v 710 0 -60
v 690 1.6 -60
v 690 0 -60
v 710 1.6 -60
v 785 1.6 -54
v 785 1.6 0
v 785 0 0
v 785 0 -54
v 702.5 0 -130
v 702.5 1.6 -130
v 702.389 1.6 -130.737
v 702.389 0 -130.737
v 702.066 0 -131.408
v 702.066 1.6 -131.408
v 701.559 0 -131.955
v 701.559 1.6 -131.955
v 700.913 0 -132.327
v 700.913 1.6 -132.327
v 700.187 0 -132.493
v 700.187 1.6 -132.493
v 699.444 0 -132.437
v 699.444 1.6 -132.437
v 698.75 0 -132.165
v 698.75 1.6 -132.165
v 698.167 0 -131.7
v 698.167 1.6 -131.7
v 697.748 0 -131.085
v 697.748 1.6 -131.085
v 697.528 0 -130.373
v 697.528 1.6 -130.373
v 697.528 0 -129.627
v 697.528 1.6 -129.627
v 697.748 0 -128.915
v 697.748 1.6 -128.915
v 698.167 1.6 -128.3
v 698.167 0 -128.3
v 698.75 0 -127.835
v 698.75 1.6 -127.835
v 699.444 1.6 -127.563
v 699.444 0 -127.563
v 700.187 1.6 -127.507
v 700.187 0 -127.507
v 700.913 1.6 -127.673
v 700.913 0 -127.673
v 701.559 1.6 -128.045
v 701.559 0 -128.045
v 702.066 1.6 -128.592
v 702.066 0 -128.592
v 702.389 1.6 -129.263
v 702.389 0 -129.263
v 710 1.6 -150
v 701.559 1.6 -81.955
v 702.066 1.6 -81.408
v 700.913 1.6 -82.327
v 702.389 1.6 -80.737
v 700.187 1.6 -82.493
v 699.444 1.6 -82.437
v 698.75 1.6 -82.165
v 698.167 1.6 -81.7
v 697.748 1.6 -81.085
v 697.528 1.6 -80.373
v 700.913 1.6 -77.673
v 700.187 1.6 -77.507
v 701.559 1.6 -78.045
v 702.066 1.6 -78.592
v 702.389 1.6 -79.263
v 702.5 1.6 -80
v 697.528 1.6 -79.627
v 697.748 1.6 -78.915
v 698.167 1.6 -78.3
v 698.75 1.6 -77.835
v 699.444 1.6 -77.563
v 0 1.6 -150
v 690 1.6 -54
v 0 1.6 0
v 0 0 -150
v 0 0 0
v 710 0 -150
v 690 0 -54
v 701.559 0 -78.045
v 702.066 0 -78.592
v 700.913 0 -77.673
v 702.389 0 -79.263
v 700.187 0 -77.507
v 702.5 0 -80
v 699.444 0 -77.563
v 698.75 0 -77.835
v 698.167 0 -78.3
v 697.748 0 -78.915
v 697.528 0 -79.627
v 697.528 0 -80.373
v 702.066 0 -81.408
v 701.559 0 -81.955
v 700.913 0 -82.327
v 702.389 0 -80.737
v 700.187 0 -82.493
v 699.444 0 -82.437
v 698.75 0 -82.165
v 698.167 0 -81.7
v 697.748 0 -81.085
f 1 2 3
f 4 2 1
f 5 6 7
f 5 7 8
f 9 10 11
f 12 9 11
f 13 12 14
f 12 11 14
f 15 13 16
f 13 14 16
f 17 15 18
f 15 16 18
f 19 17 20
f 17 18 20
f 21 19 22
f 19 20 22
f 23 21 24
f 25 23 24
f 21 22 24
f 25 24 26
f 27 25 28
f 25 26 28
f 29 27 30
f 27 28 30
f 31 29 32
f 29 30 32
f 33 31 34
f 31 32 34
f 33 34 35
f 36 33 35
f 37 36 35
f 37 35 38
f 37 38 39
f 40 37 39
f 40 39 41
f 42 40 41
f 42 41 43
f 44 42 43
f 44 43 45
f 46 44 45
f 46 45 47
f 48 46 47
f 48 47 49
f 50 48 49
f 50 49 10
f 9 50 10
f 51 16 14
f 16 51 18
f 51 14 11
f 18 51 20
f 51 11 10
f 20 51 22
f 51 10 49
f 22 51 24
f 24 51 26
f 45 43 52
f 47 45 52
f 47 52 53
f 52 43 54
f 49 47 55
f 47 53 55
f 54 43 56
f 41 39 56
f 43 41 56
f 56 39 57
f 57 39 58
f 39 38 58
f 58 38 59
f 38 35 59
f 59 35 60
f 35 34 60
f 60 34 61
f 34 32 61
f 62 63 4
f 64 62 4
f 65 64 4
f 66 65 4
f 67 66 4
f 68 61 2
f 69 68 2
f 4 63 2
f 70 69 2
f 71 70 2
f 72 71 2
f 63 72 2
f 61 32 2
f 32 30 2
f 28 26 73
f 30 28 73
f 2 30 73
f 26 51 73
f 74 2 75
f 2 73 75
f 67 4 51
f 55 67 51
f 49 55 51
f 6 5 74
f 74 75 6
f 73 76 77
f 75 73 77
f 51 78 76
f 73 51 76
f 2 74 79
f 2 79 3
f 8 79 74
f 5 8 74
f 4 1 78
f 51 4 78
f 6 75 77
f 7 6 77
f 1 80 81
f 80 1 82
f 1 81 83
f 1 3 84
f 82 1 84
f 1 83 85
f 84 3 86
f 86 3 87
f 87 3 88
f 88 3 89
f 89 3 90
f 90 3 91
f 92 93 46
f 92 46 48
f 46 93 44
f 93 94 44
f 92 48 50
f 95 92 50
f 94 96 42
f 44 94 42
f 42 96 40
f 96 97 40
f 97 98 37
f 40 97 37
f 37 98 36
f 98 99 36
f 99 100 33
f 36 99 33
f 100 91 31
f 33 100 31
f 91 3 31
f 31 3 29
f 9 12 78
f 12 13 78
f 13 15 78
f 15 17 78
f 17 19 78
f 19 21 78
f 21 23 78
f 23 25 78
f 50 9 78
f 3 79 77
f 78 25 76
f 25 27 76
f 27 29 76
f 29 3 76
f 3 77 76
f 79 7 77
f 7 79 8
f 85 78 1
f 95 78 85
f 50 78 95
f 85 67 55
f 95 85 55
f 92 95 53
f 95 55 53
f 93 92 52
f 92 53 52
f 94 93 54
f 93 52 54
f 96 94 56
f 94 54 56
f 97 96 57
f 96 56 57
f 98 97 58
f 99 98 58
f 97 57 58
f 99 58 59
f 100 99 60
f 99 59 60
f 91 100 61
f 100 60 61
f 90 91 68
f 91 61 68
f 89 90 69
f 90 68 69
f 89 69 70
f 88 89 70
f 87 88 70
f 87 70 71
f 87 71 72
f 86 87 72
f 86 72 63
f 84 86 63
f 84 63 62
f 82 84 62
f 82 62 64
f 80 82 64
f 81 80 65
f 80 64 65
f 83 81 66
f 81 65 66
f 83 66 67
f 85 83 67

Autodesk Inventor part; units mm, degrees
ref_plane "YZ Plane" through (0, 0, 0) normal (1, 0, 0) x (0, 1, 0)
ref_plane "XZ Plane" through (0, 0, 0) normal (0, 1, 0) x (-1, 0, 0)
ref_plane "XY Plane" through (0, 0, 0) normal (0, 0, 1) x (1, 0, 0)
sketch "Sketch1" plane through (0, 0, 0) normal (0, 1, 0) x (-1, 0, 0)
  line L0 (0, 0) -> (-710, 0)
  line L1 (-710, 0) -> (-710, -150)
  line L2 (-710, -150) -> (0, -150)
  line L3 (0, -150) -> (0, 0)
  dimension "d0" = 710
  dimension "d1" = 150
extrude "Extrusion1" add sketch "Sketch1" along normal blind 1.6
sketch "Sketch2" plane through (0, 1.6, 0) normal (0, 1, 0) x (1, 0, 0)
  line L0 (710, 0) -> (690, 0)
  line L1 (690, 0) -> (690, 60)
  line L2 (690, 60) -> (710, 60)
  line L3 (710, 60) -> (710, 0)
  circle A0 centre (700, 80) radius 2.5
  circle A1 centre (700, 130) radius 2.5
  line L4 (710, 150) -> (0, 150) projected
  point P0 (0, 0)
  point P1 (700, 60)
  dimension "d6" = 20
  dimension "d7" = 60
  dimension "d10" = 5
  dimension "d11" = 5
  dimension "d12" = 50
  dimension "d13" = 20
extrude "Extrusion3" cut sketch "Sketch2" against normal blind 1.6
sketch "Sketch3" plane through (690, 1.6, 0) normal (1, 0, 0) x (0, 0, -1)
  line L0 (0, -1.6) -> (54, -1.6)
  line L1 (54, -1.6) -> (54, 0)
  line L2 (54, 0) -> (0, 0)
  line L3 (0, 0) -> (0, -1.6)
  dimension "d16" = 54
  dimension "d17" = 1.6
extrude "Extrusion4" add sketch "Sketch3" along normal blind 95
properties part number "X-Axis Panel Left" material "Steel"
